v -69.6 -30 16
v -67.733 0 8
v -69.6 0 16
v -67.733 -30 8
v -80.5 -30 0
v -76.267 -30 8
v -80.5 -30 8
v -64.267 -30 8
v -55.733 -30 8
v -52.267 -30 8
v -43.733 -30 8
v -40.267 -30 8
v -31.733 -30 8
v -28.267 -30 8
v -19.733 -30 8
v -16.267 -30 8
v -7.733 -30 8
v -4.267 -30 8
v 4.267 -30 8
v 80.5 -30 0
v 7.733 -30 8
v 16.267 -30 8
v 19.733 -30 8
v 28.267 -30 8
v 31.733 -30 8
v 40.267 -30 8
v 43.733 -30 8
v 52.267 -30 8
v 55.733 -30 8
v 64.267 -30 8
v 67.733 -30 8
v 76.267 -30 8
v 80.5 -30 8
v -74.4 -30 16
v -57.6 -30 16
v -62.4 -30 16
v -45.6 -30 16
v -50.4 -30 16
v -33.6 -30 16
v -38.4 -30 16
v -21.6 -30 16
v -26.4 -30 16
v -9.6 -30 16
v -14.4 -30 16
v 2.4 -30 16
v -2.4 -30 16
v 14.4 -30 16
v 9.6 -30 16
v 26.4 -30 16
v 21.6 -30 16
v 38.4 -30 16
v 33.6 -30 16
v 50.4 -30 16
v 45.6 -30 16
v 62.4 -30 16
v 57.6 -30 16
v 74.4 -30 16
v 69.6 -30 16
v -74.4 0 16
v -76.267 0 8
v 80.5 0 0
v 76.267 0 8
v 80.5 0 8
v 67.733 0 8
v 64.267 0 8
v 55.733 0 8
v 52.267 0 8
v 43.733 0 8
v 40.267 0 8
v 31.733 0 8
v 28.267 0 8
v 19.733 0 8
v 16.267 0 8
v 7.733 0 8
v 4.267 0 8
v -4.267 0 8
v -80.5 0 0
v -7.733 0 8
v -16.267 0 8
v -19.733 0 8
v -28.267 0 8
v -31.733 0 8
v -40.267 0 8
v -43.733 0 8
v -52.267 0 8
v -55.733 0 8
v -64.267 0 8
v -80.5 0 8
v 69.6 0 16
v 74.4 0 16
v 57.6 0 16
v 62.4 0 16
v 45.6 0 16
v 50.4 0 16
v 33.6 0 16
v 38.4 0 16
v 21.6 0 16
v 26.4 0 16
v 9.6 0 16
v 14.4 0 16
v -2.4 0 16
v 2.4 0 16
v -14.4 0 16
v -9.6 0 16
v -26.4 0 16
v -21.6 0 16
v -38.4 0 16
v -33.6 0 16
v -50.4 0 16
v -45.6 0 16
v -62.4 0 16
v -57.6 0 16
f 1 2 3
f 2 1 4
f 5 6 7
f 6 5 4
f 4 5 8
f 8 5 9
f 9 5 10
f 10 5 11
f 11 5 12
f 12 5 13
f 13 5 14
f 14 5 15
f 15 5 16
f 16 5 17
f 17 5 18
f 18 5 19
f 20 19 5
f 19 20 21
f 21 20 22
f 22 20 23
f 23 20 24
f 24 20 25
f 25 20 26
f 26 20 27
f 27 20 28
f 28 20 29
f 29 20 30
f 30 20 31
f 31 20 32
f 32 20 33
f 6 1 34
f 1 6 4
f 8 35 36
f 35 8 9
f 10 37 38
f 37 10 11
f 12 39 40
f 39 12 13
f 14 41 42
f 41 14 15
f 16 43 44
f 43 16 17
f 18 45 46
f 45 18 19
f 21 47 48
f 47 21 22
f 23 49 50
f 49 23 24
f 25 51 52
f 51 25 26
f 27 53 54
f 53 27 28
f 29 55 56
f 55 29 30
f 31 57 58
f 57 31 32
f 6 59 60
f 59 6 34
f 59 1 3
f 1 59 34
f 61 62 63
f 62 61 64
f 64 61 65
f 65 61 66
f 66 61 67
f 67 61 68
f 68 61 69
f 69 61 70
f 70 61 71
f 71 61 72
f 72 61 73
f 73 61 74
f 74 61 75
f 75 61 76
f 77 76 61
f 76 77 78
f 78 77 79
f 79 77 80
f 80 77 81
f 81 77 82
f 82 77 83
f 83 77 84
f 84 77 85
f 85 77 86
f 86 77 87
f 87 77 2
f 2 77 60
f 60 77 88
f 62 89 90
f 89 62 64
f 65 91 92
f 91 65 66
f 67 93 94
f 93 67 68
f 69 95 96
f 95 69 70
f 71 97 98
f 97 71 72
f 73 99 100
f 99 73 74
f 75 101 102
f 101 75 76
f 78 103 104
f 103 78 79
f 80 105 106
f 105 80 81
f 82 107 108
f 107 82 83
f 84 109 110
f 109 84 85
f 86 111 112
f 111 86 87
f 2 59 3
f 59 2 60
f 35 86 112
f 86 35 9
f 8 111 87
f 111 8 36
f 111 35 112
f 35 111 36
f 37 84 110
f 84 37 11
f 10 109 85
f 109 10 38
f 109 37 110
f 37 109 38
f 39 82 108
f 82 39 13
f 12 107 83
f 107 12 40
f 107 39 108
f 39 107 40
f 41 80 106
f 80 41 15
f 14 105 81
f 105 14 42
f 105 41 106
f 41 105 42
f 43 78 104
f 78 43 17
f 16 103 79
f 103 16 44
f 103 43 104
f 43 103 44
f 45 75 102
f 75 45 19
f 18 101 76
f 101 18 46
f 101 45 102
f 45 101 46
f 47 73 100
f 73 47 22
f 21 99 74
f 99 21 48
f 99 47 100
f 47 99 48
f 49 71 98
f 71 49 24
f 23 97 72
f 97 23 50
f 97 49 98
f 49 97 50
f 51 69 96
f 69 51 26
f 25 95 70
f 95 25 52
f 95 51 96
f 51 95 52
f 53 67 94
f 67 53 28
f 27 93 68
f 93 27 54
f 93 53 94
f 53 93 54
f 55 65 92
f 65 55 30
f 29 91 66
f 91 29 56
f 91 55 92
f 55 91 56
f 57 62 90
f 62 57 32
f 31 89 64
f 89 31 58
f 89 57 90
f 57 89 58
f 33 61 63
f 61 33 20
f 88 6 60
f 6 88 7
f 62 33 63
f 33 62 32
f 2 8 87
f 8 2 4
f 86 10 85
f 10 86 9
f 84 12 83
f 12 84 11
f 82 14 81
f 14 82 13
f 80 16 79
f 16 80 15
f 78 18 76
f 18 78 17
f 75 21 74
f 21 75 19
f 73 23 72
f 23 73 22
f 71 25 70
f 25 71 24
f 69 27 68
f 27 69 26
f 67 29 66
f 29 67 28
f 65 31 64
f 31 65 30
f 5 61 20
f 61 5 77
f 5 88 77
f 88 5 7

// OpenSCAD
$fn = 32;

// ----------------------------------------------------------------------
// Toothed rack, 13 teeth
// 12 mm pitch, 8 mm teeth
// ----------------------------------------------------------------------

// --- parameters (mm) ---
bar_w = 30;       // bar width (Y)
seat_tol = 0.15;  // tolerance at the seating features
free_tol = 0.5;   // general tolerance on the free sizes
bar_h = 8;        // bar height (Z)
teeth = 13;       // number of teeth
pitch = 12;       // tooth pitch
tooth_h = 8;      // tooth height above the bar
root_w = 9;       // tooth width at the root
crest_w = 4.8;    // tooth width at the crest

// --- derived feature positions (mm) ---
span = (teeth - 1) * pitch;  // = 144   distance between the outer teeth
bar_l = span + root_w + 8;   // = 161   bar length: teeth plus 4 mm at each end
tooth_x = -span / 2;         // = -72   X of the first tooth
height = bar_h + tooth_h;    // = 16   overall height
feature_centers = [
  [tooth_x + 0 * pitch, -bar_w / 2],
  [tooth_x + 1 * pitch, -bar_w / 2],
  [tooth_x + 2 * pitch, -bar_w / 2],
  [tooth_x + 3 * pitch, -bar_w / 2],
  [tooth_x + 4 * pitch, -bar_w / 2],
  [tooth_x + 5 * pitch, -bar_w / 2],
  [tooth_x + 6 * pitch, -bar_w / 2],
  [tooth_x + 7 * pitch, -bar_w / 2],
  [tooth_x + 8 * pitch, -bar_w / 2],
  [tooth_x + 9 * pitch, -bar_w / 2],
  [tooth_x + 10 * pitch, -bar_w / 2],
  [tooth_x + 11 * pitch, -bar_w / 2],
  [tooth_x + 12 * pitch, -bar_w / 2]
];   // tooth centre line, drives the tooth loop

// bar with a rack of teeth, one extruded trapezoium per centre
module rack_tooth() {
  linear_extrude(height = bar_w)
    polygon(points = [
      [0, 0],
      [root_w, 0],
      [root_w / 2 + crest_w / 2, tooth_h + 1],
      [root_w / 2 - crest_w / 2, tooth_h + 1]
    ]);
}

union() {
  translate([-bar_l / 2, -bar_w, 0]) cube([bar_l, bar_w, bar_h]);
  for (centre = feature_centers)
    translate([centre[0] - root_w / 2, 0, bar_h - 1]) rotate([90, 0, 0]) rack_tooth();
}
